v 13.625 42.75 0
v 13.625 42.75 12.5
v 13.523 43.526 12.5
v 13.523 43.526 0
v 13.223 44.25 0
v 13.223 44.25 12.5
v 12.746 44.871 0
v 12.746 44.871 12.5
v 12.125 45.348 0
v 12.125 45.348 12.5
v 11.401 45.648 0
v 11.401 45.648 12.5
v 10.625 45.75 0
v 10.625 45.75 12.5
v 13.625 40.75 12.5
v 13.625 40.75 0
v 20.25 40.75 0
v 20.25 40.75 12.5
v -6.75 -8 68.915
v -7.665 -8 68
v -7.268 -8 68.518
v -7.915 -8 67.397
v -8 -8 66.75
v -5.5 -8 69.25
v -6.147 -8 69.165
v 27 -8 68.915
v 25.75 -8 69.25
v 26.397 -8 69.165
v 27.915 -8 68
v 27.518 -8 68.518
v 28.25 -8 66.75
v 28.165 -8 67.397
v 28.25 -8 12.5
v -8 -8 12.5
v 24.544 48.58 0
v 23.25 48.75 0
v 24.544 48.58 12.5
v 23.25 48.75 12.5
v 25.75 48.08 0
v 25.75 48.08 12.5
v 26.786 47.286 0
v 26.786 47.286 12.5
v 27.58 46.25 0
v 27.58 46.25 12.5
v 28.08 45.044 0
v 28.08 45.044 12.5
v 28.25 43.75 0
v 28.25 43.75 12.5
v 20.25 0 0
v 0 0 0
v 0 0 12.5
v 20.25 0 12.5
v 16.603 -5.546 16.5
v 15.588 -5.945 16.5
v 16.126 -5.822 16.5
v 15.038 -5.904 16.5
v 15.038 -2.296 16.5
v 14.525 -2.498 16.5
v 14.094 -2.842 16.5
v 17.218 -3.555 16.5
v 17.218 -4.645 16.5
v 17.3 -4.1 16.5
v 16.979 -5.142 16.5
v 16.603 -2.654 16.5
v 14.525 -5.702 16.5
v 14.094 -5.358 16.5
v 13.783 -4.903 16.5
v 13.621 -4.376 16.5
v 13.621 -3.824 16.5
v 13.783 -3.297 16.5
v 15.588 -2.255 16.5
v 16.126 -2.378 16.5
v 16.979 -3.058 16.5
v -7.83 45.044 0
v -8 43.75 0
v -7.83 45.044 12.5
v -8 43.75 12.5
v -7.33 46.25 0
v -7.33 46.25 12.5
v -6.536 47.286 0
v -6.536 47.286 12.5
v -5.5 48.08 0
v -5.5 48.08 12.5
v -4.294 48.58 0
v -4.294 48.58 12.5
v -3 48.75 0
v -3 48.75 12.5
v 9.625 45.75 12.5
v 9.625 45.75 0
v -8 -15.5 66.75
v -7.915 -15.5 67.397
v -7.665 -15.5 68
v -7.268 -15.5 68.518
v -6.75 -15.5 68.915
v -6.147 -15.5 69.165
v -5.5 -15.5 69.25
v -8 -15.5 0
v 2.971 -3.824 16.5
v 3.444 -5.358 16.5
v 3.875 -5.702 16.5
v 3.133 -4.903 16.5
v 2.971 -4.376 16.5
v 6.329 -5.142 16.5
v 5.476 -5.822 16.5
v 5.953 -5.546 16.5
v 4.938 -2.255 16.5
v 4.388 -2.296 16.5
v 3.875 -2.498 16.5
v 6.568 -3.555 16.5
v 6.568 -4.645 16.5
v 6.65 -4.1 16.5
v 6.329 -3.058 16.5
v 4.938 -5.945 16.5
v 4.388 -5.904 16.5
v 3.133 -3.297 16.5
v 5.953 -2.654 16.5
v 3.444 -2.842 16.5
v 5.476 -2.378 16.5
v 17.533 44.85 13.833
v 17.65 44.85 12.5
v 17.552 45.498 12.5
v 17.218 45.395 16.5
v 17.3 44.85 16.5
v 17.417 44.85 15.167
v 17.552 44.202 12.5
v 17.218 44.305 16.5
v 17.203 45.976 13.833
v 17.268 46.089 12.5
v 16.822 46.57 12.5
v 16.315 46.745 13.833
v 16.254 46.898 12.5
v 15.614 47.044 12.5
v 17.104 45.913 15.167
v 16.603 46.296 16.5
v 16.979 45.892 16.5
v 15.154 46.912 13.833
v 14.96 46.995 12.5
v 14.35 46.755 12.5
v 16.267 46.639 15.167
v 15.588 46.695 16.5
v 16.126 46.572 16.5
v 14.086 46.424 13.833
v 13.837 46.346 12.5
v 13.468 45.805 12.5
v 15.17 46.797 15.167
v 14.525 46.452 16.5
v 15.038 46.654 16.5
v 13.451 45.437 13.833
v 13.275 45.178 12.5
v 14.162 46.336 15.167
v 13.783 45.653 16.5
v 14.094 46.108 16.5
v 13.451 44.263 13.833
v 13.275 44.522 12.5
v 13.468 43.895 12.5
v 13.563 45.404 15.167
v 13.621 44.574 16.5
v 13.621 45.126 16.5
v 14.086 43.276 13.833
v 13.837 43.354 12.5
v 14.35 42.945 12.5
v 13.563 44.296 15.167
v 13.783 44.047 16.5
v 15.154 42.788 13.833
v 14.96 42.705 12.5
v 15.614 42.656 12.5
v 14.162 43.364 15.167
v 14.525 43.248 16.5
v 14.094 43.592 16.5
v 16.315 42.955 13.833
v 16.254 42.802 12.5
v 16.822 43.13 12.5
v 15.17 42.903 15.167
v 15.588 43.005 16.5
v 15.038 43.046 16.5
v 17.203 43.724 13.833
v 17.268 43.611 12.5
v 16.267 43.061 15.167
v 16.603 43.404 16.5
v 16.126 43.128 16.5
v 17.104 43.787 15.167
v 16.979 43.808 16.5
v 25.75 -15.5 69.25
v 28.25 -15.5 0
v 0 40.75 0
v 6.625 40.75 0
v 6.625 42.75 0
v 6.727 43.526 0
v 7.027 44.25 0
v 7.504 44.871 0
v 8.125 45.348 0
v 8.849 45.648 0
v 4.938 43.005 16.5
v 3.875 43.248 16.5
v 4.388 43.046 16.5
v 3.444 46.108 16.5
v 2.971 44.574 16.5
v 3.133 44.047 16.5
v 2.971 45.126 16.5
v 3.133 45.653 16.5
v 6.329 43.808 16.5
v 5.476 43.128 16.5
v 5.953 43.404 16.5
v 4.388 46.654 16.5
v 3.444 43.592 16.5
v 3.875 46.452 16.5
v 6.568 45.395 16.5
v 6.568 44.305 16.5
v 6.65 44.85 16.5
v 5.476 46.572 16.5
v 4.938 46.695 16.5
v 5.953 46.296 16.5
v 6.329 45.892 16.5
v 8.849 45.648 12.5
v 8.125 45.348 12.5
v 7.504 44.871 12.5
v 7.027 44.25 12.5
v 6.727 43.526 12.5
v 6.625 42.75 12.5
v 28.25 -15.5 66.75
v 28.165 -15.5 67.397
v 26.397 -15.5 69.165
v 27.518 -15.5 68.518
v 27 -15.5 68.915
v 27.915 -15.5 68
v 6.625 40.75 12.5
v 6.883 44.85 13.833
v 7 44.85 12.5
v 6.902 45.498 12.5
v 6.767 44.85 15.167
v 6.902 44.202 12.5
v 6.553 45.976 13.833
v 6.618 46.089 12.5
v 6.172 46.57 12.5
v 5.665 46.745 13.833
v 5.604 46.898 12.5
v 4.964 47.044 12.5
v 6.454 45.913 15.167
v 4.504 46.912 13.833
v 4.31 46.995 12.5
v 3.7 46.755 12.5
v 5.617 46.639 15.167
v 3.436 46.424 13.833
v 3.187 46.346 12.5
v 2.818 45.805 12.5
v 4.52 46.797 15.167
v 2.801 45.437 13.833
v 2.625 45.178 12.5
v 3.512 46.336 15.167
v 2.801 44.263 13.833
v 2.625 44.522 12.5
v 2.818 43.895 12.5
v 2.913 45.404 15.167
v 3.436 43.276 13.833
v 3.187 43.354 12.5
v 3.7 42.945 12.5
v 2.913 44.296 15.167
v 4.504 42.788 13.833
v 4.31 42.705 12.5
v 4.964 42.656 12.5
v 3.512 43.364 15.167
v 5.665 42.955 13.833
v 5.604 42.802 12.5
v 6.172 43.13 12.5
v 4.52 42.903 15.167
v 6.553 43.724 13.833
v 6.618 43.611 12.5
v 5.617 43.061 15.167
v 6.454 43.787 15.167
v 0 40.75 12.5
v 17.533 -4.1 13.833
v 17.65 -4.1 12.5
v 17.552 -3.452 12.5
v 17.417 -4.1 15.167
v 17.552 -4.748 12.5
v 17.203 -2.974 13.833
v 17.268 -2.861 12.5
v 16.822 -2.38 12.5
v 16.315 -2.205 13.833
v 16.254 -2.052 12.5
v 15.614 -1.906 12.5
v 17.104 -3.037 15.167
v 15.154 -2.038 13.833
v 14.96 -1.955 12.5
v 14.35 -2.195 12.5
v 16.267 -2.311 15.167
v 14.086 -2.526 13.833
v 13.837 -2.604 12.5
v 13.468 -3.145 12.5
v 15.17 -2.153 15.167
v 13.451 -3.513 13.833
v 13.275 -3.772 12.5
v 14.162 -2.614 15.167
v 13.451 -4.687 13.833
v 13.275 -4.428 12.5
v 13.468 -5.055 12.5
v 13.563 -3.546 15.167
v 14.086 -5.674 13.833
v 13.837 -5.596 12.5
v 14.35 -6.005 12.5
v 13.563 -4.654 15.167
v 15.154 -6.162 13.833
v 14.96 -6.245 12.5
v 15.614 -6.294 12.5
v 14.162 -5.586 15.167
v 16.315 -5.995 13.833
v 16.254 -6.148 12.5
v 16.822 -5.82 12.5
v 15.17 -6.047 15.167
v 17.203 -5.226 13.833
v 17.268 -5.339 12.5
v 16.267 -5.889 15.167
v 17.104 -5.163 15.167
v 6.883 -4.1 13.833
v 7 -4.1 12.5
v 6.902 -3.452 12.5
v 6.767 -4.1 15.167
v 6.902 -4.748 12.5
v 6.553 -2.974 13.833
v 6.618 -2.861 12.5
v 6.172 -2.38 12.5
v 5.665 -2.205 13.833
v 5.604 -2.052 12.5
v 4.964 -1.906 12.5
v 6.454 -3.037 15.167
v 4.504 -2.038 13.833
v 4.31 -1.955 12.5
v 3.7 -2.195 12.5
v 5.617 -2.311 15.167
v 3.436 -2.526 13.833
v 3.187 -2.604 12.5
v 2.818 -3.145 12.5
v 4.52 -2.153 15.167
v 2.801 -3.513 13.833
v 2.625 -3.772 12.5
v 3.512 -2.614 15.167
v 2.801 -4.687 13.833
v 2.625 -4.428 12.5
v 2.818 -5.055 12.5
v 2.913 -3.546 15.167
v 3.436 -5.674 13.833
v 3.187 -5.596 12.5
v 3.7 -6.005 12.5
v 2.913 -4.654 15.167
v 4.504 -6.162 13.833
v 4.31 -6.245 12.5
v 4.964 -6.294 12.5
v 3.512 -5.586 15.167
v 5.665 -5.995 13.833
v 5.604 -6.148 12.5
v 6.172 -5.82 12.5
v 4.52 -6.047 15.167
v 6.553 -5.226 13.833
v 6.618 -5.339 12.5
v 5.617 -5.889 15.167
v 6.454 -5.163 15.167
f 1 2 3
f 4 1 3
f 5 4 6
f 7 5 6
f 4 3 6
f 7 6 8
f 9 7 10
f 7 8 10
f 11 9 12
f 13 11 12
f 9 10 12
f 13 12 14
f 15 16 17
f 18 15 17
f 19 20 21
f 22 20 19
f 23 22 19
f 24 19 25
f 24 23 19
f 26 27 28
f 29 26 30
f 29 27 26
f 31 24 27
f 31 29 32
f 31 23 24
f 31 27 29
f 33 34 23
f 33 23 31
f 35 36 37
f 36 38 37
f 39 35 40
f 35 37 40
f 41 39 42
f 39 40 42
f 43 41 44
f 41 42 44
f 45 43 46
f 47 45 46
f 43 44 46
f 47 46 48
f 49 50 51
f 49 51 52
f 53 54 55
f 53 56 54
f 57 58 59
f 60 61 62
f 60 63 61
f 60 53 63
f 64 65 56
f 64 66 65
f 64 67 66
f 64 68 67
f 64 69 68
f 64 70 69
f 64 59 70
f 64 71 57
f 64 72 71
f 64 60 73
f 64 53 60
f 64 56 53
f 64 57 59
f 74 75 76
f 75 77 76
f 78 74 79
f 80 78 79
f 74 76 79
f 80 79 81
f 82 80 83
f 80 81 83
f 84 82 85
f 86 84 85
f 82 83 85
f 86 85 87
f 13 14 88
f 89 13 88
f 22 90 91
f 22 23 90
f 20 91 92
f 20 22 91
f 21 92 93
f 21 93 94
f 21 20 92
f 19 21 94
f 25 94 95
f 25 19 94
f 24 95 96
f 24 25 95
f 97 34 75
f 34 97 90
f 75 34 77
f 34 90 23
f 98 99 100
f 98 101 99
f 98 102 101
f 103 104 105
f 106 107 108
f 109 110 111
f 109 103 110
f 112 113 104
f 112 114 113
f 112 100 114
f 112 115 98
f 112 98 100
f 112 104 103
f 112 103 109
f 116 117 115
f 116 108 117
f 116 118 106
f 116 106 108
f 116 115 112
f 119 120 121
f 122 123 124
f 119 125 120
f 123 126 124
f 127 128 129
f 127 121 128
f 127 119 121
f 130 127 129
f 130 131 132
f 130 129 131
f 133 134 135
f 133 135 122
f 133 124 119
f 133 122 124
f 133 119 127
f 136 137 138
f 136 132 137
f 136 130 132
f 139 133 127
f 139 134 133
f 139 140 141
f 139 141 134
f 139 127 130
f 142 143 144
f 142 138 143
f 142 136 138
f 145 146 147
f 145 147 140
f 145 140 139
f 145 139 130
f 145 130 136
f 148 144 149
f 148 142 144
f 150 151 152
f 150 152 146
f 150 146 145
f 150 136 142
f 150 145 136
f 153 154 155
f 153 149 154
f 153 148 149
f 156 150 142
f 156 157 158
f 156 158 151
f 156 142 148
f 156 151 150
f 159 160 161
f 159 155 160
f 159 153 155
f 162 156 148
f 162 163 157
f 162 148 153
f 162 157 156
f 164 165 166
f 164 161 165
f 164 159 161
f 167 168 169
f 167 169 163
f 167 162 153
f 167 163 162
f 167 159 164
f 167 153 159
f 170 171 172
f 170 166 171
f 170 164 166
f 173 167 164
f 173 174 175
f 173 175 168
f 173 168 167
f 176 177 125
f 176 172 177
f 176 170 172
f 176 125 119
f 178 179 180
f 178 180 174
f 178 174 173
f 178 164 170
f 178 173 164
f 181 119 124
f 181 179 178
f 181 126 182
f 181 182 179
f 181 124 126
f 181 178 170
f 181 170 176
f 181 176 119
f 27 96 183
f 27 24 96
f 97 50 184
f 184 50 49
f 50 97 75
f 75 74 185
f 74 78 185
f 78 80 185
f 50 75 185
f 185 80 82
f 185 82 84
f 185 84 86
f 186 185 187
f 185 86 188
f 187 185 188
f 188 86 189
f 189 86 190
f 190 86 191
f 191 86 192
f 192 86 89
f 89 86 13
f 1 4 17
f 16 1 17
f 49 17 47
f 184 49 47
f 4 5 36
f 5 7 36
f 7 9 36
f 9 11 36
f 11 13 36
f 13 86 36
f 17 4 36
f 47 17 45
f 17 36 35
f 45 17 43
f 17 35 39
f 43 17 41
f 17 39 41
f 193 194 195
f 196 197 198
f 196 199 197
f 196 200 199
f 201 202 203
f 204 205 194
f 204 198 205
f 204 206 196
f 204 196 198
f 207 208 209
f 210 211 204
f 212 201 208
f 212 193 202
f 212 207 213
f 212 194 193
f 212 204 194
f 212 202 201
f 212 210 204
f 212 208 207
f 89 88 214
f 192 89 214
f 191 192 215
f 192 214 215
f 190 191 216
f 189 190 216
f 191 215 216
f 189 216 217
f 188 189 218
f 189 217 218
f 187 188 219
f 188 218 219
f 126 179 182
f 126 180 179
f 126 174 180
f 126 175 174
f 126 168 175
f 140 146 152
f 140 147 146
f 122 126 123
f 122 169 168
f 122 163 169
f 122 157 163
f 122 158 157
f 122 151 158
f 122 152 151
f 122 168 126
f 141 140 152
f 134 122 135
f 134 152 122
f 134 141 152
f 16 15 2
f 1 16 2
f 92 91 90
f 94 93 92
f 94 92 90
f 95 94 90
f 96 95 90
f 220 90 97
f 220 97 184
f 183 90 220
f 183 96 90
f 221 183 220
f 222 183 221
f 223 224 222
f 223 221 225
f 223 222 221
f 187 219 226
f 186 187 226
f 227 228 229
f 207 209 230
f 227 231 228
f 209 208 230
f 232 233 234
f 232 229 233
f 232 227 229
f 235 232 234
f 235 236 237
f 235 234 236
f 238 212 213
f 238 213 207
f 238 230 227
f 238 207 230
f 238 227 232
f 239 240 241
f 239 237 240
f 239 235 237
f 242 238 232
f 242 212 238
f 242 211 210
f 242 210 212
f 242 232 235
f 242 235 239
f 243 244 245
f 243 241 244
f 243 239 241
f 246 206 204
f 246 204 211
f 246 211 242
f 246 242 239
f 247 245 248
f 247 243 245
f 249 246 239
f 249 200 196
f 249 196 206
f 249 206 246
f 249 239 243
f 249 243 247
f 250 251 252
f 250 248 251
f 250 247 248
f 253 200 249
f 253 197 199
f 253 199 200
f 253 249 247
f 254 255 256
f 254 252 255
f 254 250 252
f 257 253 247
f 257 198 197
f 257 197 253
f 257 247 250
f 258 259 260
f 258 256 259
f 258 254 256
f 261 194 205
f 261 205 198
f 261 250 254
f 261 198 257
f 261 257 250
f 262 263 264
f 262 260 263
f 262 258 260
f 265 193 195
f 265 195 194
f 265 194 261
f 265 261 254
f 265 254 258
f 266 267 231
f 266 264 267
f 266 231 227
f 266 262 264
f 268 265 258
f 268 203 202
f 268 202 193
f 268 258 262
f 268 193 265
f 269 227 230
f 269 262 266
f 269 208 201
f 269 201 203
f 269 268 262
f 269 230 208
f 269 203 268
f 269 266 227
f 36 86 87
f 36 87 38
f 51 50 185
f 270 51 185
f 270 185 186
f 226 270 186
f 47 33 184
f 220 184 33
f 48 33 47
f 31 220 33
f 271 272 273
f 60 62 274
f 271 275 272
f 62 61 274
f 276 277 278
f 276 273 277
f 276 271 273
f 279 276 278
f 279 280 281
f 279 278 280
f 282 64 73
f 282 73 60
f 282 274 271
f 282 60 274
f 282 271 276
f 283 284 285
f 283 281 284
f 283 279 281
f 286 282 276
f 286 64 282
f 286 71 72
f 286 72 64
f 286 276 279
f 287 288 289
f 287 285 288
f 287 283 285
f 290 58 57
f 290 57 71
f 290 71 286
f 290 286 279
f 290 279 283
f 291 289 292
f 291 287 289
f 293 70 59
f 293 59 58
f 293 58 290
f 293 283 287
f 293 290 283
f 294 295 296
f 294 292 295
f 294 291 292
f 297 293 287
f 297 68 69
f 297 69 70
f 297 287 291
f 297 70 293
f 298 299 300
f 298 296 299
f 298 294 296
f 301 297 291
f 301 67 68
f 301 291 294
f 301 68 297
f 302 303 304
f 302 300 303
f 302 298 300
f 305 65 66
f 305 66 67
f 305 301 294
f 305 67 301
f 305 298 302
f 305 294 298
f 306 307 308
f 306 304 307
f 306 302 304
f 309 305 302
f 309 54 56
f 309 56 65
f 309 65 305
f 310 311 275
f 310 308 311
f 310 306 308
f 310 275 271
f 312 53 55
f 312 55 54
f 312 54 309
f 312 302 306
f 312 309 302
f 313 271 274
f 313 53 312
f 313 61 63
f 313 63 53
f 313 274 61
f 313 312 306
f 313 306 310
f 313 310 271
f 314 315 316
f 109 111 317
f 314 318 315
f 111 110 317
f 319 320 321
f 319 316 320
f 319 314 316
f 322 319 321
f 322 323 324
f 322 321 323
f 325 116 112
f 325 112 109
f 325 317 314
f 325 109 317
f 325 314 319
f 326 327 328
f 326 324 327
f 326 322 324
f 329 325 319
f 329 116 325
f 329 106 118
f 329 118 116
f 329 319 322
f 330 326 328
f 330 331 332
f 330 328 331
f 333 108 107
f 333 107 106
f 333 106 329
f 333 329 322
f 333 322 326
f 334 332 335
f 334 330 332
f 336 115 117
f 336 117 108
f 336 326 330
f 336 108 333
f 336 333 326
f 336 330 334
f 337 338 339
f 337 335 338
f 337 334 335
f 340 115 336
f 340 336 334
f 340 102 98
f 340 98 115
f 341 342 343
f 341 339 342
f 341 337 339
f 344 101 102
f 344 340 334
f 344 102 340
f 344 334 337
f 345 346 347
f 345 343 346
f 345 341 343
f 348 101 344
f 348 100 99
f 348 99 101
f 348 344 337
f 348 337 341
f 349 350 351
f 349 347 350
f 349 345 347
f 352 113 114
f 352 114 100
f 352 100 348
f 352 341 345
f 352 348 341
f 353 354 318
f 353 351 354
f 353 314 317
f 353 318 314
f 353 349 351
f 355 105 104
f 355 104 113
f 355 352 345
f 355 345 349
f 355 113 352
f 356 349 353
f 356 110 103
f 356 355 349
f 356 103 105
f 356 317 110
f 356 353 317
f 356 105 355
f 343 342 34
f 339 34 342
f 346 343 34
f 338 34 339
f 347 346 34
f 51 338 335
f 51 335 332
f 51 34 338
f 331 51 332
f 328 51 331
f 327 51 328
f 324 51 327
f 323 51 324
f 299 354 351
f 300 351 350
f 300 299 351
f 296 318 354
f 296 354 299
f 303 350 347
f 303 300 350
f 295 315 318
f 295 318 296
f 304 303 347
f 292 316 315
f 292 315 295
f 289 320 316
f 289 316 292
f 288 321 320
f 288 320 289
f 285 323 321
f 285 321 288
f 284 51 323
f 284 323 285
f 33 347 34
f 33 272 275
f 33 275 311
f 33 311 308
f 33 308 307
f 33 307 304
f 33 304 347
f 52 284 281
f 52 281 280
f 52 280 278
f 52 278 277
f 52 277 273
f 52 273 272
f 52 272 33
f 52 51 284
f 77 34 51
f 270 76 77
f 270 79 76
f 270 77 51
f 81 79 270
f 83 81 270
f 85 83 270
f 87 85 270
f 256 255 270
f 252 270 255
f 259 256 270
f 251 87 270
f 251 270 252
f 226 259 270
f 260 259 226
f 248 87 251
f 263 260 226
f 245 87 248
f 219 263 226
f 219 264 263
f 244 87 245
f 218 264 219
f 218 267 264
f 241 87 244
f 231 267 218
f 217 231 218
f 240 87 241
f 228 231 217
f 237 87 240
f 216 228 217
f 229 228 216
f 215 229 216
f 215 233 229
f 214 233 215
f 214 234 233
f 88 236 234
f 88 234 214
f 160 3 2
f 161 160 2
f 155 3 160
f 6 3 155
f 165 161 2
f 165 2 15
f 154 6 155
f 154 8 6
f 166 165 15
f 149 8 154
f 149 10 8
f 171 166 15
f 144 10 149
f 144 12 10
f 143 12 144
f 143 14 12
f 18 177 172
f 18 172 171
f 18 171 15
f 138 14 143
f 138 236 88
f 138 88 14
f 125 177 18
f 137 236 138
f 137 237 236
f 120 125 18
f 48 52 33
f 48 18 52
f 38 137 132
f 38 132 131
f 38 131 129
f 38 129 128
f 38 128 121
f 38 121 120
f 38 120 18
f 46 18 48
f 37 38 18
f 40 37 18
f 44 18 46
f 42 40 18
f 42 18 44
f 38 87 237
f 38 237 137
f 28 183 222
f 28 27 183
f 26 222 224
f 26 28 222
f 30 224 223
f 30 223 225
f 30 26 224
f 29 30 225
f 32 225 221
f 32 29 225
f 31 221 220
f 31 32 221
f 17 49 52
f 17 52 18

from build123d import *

# Parameters (mm, degrees)
SKETCH1_W                = 36.25
SKETCH1_H                = 56.75
SKETCH1_W_2              = 20.25
SKETCH1_H_2              = 40.75
BOSS_EXTRUDE1_DEPTH      = 12.5
SKETCH3_W                = 36.25
SKETCH3_H                = 7.5
BOSS_EXTRUDE2_DEPTH      = 56.75
BOSS_EXTRUDE2_DEPTH_BACK = 12.5
CUT_EXTRUDE1_DEPTH       = 13.5
SKETCH5_R                = 2.2
BOSS_EXTRUDE3_DEPTH      = 4
BOSS_EXTRUDE3_TAPER      = 5
FILLET1_R                = 5
FILLET2_R                = 2.5


with BuildPart() as part:
    # Sketch1 → Boss-Extrude1 (new body)
    with BuildSketch(Plane.XY):
        with Locations((10.125, 20.375)):
            Rectangle(SKETCH1_W, SKETCH1_H)
        with Locations((10.125, 20.375)):
            Rectangle(SKETCH1_W_2, SKETCH1_H_2, mode=Mode.SUBTRACT)
    extrude(amount=BOSS_EXTRUDE1_DEPTH)

    # Sketch3 → Boss-Extrude2 (add, two sides)
    with BuildSketch(Plane.XY.offset(12.5)) as boss_extrude2_sk:
        with Locations((10.125, -11.75)):
            Rectangle(SKETCH3_W, SKETCH3_H)
    extrude(amount=BOSS_EXTRUDE2_DEPTH)
    extrude(boss_extrude2_sk.sketch, amount=-BOSS_EXTRUDE2_DEPTH_BACK)

    # Sketch4 → Cut-Extrude1 (cut, through all)
    with BuildSketch(Plane.XY.offset(12.5)):
        with BuildLine():
            Line((6.625, 40.75), (13.625, 40.75))
            Line((13.625, 40.75), (13.625, 42.75))
            ThreePointArc((13.625, 42.75), (12.746320344, 44.871320344), (10.625, 45.75))
            Line((10.625, 45.75), (9.625, 45.75))
            ThreePointArc((9.625, 45.75), (7.503679656, 44.871320344), (6.625, 42.75))
            Line((6.625, 42.75), (6.625, 40.75))
        make_face()
    extrude(amount=-CUT_EXTRUDE1_DEPTH, mode=Mode.SUBTRACT)

    # Sketch5 → Boss-Extrude3 (add)
    with BuildSketch(Plane.XY.offset(12.5)):
        with Locations((4.8, 44.85)):
            Circle(SKETCH5_R)
        with Locations((15.45, 44.85)):
            Circle(SKETCH5_R)
        with Locations((15.45, -4.1)):
            Circle(SKETCH5_R)
        with Locations((4.8, -4.1)):
            Circle(SKETCH5_R)
    extrude(amount=BOSS_EXTRUDE3_DEPTH, taper=BOSS_EXTRUDE3_TAPER)

    # Fillet1
    fillet1_edges = [part.edges().sort_by_distance(p)[0] for p in [
        (-8, 48.75, 6.25),
        (28.25, 48.75, 6.25),
    ]]
    fillet(fillet1_edges, radius=FILLET1_R)

    # Fillet2
    fillet2_edges = [part.edges().sort_by_distance(p)[0] for p in [
        (-8, -11.75, 69.25),
        (28.25, -11.75, 69.25),
    ]]
    fillet(fillet2_edges, radius=FILLET2_R)


solid = part.part
